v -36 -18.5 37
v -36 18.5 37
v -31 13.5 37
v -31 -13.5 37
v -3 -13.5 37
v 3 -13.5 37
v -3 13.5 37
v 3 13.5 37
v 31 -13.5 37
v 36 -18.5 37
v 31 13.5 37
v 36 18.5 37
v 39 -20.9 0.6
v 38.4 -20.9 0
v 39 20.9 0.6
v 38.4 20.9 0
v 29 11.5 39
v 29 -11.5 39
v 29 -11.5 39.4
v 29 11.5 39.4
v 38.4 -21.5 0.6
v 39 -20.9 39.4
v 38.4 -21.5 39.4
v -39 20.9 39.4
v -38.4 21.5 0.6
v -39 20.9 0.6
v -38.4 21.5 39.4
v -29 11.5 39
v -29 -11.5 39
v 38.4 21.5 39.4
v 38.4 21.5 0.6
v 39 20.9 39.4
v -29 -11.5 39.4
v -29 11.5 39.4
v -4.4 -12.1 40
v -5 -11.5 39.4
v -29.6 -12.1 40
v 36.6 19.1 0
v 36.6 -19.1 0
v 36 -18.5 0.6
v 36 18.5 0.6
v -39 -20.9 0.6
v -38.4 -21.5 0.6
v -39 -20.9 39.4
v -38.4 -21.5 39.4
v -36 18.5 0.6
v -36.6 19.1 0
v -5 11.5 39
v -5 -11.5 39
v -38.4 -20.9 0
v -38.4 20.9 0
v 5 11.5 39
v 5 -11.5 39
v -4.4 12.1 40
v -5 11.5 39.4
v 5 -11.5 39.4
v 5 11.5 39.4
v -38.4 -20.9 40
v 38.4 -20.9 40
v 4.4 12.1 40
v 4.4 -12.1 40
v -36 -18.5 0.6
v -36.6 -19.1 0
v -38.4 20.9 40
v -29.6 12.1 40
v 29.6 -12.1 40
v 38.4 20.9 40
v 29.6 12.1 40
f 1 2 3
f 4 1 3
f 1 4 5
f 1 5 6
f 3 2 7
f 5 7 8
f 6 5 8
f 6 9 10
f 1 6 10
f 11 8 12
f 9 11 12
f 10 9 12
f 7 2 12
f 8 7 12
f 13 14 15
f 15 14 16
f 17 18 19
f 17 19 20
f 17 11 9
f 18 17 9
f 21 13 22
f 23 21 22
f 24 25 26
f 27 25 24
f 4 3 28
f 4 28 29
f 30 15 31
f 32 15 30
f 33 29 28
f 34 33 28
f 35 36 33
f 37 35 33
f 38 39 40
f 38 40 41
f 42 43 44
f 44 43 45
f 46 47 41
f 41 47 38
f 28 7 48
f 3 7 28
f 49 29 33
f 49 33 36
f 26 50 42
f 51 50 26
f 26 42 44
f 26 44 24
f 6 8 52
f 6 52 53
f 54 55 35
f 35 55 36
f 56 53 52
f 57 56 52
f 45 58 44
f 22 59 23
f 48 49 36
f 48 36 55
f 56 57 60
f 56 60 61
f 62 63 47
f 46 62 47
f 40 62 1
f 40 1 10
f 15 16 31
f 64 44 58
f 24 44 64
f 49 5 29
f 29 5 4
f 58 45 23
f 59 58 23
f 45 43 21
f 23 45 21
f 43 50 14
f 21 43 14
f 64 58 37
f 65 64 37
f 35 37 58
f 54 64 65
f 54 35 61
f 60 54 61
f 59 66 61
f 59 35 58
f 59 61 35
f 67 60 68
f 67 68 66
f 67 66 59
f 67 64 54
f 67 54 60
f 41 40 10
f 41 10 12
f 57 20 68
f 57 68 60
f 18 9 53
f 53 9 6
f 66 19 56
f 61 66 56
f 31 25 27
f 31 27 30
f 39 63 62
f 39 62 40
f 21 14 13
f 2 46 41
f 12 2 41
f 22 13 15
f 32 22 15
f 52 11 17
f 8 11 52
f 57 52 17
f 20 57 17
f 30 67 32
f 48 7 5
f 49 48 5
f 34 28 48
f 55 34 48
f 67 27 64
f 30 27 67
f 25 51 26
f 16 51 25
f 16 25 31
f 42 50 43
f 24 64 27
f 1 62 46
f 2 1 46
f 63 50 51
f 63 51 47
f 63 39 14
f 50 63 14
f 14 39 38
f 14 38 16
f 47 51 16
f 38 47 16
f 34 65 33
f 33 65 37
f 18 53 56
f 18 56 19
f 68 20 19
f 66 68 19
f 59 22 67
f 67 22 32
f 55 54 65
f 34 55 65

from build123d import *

# Parameters (mm, degrees)
SKETCH001_W     = 78
SKETCH001_H     = 43
PAD009_DEPTH    = 40
THICKNESS_T     = -3
SKETCH008_W     = 24
SKETCH008_H     = 23
POCKET_DEPTH    = 40.001
CHAMFER009_SIZE = 2
CHAMFER010_SIZE = 0.6


with BuildPart() as part:
    # Sketch001 → Pad009 (new body)
    with BuildSketch(Plane.XY):
        Rectangle(SKETCH001_W, SKETCH001_H)
    extrude(amount=PAD009_DEPTH)

    # Thickness
    thickness_openings = [part.faces().sort_by_distance(p)[0] for p in [
        (0, 0, 0),
    ]]
    offset(amount=THICKNESS_T, openings=thickness_openings)

    # Sketch008 → Pocket (cut, through all)
    with BuildSketch(Plane.XY):
        with Locations((-17, 0)):
            Rectangle(SKETCH008_W, SKETCH008_H)
        with Locations((17, 0)):
            Rectangle(SKETCH008_W, SKETCH008_H)
    extrude(amount=POCKET_DEPTH, mode=Mode.SUBTRACT)

    # Chamfer009
    chamfer009_edges = [part.edges().sort_by_distance(p)[0] for p in [
        (-5, 0, 37),
        (-17, -11.5, 37),
        (-29, 0, 37),
        (17, -11.5, 37),
        (5, 0, 37),
        (29, 0, 37),
        (-17, 11.5, 37),
        (17, 11.5, 37),
    ]]
    chamfer(chamfer009_edges, length=CHAMFER009_SIZE)

    # Chamfer010
    chamfer010_edges = [part.edges().sort_by_distance(p)[0] for p in [
        (-39, 0, 0),
        (0, -21.5, 0),
        (39, 0, 0),
        (0, 21.5, 0),
        (-36, 0, 0),
        (0, 18.5, 0),
        (36, 0, 0),
        (0, -18.5, 0),
        (-39, 0, 40),
        (0, 21.5, 40),
        (0, -21.5, 40),
        (39, 0, 40),
        (17, -11.5, 40),
        (29, 0, 40),
        (17, 11.5, 40),
        (5, 0, 40),
        (-17, -11.5, 40),
        (-5, 0, 40),
        (-17, 11.5, 40),
        (-29, 0, 40),
        (39, 21.5, 20),
        (-39, 21.5, 20),
        (-39, -21.5, 20),
        (39, -21.5, 20),
    ]]
    chamfer(chamfer010_edges, length=CHAMFER010_SIZE)


solid = part.part
